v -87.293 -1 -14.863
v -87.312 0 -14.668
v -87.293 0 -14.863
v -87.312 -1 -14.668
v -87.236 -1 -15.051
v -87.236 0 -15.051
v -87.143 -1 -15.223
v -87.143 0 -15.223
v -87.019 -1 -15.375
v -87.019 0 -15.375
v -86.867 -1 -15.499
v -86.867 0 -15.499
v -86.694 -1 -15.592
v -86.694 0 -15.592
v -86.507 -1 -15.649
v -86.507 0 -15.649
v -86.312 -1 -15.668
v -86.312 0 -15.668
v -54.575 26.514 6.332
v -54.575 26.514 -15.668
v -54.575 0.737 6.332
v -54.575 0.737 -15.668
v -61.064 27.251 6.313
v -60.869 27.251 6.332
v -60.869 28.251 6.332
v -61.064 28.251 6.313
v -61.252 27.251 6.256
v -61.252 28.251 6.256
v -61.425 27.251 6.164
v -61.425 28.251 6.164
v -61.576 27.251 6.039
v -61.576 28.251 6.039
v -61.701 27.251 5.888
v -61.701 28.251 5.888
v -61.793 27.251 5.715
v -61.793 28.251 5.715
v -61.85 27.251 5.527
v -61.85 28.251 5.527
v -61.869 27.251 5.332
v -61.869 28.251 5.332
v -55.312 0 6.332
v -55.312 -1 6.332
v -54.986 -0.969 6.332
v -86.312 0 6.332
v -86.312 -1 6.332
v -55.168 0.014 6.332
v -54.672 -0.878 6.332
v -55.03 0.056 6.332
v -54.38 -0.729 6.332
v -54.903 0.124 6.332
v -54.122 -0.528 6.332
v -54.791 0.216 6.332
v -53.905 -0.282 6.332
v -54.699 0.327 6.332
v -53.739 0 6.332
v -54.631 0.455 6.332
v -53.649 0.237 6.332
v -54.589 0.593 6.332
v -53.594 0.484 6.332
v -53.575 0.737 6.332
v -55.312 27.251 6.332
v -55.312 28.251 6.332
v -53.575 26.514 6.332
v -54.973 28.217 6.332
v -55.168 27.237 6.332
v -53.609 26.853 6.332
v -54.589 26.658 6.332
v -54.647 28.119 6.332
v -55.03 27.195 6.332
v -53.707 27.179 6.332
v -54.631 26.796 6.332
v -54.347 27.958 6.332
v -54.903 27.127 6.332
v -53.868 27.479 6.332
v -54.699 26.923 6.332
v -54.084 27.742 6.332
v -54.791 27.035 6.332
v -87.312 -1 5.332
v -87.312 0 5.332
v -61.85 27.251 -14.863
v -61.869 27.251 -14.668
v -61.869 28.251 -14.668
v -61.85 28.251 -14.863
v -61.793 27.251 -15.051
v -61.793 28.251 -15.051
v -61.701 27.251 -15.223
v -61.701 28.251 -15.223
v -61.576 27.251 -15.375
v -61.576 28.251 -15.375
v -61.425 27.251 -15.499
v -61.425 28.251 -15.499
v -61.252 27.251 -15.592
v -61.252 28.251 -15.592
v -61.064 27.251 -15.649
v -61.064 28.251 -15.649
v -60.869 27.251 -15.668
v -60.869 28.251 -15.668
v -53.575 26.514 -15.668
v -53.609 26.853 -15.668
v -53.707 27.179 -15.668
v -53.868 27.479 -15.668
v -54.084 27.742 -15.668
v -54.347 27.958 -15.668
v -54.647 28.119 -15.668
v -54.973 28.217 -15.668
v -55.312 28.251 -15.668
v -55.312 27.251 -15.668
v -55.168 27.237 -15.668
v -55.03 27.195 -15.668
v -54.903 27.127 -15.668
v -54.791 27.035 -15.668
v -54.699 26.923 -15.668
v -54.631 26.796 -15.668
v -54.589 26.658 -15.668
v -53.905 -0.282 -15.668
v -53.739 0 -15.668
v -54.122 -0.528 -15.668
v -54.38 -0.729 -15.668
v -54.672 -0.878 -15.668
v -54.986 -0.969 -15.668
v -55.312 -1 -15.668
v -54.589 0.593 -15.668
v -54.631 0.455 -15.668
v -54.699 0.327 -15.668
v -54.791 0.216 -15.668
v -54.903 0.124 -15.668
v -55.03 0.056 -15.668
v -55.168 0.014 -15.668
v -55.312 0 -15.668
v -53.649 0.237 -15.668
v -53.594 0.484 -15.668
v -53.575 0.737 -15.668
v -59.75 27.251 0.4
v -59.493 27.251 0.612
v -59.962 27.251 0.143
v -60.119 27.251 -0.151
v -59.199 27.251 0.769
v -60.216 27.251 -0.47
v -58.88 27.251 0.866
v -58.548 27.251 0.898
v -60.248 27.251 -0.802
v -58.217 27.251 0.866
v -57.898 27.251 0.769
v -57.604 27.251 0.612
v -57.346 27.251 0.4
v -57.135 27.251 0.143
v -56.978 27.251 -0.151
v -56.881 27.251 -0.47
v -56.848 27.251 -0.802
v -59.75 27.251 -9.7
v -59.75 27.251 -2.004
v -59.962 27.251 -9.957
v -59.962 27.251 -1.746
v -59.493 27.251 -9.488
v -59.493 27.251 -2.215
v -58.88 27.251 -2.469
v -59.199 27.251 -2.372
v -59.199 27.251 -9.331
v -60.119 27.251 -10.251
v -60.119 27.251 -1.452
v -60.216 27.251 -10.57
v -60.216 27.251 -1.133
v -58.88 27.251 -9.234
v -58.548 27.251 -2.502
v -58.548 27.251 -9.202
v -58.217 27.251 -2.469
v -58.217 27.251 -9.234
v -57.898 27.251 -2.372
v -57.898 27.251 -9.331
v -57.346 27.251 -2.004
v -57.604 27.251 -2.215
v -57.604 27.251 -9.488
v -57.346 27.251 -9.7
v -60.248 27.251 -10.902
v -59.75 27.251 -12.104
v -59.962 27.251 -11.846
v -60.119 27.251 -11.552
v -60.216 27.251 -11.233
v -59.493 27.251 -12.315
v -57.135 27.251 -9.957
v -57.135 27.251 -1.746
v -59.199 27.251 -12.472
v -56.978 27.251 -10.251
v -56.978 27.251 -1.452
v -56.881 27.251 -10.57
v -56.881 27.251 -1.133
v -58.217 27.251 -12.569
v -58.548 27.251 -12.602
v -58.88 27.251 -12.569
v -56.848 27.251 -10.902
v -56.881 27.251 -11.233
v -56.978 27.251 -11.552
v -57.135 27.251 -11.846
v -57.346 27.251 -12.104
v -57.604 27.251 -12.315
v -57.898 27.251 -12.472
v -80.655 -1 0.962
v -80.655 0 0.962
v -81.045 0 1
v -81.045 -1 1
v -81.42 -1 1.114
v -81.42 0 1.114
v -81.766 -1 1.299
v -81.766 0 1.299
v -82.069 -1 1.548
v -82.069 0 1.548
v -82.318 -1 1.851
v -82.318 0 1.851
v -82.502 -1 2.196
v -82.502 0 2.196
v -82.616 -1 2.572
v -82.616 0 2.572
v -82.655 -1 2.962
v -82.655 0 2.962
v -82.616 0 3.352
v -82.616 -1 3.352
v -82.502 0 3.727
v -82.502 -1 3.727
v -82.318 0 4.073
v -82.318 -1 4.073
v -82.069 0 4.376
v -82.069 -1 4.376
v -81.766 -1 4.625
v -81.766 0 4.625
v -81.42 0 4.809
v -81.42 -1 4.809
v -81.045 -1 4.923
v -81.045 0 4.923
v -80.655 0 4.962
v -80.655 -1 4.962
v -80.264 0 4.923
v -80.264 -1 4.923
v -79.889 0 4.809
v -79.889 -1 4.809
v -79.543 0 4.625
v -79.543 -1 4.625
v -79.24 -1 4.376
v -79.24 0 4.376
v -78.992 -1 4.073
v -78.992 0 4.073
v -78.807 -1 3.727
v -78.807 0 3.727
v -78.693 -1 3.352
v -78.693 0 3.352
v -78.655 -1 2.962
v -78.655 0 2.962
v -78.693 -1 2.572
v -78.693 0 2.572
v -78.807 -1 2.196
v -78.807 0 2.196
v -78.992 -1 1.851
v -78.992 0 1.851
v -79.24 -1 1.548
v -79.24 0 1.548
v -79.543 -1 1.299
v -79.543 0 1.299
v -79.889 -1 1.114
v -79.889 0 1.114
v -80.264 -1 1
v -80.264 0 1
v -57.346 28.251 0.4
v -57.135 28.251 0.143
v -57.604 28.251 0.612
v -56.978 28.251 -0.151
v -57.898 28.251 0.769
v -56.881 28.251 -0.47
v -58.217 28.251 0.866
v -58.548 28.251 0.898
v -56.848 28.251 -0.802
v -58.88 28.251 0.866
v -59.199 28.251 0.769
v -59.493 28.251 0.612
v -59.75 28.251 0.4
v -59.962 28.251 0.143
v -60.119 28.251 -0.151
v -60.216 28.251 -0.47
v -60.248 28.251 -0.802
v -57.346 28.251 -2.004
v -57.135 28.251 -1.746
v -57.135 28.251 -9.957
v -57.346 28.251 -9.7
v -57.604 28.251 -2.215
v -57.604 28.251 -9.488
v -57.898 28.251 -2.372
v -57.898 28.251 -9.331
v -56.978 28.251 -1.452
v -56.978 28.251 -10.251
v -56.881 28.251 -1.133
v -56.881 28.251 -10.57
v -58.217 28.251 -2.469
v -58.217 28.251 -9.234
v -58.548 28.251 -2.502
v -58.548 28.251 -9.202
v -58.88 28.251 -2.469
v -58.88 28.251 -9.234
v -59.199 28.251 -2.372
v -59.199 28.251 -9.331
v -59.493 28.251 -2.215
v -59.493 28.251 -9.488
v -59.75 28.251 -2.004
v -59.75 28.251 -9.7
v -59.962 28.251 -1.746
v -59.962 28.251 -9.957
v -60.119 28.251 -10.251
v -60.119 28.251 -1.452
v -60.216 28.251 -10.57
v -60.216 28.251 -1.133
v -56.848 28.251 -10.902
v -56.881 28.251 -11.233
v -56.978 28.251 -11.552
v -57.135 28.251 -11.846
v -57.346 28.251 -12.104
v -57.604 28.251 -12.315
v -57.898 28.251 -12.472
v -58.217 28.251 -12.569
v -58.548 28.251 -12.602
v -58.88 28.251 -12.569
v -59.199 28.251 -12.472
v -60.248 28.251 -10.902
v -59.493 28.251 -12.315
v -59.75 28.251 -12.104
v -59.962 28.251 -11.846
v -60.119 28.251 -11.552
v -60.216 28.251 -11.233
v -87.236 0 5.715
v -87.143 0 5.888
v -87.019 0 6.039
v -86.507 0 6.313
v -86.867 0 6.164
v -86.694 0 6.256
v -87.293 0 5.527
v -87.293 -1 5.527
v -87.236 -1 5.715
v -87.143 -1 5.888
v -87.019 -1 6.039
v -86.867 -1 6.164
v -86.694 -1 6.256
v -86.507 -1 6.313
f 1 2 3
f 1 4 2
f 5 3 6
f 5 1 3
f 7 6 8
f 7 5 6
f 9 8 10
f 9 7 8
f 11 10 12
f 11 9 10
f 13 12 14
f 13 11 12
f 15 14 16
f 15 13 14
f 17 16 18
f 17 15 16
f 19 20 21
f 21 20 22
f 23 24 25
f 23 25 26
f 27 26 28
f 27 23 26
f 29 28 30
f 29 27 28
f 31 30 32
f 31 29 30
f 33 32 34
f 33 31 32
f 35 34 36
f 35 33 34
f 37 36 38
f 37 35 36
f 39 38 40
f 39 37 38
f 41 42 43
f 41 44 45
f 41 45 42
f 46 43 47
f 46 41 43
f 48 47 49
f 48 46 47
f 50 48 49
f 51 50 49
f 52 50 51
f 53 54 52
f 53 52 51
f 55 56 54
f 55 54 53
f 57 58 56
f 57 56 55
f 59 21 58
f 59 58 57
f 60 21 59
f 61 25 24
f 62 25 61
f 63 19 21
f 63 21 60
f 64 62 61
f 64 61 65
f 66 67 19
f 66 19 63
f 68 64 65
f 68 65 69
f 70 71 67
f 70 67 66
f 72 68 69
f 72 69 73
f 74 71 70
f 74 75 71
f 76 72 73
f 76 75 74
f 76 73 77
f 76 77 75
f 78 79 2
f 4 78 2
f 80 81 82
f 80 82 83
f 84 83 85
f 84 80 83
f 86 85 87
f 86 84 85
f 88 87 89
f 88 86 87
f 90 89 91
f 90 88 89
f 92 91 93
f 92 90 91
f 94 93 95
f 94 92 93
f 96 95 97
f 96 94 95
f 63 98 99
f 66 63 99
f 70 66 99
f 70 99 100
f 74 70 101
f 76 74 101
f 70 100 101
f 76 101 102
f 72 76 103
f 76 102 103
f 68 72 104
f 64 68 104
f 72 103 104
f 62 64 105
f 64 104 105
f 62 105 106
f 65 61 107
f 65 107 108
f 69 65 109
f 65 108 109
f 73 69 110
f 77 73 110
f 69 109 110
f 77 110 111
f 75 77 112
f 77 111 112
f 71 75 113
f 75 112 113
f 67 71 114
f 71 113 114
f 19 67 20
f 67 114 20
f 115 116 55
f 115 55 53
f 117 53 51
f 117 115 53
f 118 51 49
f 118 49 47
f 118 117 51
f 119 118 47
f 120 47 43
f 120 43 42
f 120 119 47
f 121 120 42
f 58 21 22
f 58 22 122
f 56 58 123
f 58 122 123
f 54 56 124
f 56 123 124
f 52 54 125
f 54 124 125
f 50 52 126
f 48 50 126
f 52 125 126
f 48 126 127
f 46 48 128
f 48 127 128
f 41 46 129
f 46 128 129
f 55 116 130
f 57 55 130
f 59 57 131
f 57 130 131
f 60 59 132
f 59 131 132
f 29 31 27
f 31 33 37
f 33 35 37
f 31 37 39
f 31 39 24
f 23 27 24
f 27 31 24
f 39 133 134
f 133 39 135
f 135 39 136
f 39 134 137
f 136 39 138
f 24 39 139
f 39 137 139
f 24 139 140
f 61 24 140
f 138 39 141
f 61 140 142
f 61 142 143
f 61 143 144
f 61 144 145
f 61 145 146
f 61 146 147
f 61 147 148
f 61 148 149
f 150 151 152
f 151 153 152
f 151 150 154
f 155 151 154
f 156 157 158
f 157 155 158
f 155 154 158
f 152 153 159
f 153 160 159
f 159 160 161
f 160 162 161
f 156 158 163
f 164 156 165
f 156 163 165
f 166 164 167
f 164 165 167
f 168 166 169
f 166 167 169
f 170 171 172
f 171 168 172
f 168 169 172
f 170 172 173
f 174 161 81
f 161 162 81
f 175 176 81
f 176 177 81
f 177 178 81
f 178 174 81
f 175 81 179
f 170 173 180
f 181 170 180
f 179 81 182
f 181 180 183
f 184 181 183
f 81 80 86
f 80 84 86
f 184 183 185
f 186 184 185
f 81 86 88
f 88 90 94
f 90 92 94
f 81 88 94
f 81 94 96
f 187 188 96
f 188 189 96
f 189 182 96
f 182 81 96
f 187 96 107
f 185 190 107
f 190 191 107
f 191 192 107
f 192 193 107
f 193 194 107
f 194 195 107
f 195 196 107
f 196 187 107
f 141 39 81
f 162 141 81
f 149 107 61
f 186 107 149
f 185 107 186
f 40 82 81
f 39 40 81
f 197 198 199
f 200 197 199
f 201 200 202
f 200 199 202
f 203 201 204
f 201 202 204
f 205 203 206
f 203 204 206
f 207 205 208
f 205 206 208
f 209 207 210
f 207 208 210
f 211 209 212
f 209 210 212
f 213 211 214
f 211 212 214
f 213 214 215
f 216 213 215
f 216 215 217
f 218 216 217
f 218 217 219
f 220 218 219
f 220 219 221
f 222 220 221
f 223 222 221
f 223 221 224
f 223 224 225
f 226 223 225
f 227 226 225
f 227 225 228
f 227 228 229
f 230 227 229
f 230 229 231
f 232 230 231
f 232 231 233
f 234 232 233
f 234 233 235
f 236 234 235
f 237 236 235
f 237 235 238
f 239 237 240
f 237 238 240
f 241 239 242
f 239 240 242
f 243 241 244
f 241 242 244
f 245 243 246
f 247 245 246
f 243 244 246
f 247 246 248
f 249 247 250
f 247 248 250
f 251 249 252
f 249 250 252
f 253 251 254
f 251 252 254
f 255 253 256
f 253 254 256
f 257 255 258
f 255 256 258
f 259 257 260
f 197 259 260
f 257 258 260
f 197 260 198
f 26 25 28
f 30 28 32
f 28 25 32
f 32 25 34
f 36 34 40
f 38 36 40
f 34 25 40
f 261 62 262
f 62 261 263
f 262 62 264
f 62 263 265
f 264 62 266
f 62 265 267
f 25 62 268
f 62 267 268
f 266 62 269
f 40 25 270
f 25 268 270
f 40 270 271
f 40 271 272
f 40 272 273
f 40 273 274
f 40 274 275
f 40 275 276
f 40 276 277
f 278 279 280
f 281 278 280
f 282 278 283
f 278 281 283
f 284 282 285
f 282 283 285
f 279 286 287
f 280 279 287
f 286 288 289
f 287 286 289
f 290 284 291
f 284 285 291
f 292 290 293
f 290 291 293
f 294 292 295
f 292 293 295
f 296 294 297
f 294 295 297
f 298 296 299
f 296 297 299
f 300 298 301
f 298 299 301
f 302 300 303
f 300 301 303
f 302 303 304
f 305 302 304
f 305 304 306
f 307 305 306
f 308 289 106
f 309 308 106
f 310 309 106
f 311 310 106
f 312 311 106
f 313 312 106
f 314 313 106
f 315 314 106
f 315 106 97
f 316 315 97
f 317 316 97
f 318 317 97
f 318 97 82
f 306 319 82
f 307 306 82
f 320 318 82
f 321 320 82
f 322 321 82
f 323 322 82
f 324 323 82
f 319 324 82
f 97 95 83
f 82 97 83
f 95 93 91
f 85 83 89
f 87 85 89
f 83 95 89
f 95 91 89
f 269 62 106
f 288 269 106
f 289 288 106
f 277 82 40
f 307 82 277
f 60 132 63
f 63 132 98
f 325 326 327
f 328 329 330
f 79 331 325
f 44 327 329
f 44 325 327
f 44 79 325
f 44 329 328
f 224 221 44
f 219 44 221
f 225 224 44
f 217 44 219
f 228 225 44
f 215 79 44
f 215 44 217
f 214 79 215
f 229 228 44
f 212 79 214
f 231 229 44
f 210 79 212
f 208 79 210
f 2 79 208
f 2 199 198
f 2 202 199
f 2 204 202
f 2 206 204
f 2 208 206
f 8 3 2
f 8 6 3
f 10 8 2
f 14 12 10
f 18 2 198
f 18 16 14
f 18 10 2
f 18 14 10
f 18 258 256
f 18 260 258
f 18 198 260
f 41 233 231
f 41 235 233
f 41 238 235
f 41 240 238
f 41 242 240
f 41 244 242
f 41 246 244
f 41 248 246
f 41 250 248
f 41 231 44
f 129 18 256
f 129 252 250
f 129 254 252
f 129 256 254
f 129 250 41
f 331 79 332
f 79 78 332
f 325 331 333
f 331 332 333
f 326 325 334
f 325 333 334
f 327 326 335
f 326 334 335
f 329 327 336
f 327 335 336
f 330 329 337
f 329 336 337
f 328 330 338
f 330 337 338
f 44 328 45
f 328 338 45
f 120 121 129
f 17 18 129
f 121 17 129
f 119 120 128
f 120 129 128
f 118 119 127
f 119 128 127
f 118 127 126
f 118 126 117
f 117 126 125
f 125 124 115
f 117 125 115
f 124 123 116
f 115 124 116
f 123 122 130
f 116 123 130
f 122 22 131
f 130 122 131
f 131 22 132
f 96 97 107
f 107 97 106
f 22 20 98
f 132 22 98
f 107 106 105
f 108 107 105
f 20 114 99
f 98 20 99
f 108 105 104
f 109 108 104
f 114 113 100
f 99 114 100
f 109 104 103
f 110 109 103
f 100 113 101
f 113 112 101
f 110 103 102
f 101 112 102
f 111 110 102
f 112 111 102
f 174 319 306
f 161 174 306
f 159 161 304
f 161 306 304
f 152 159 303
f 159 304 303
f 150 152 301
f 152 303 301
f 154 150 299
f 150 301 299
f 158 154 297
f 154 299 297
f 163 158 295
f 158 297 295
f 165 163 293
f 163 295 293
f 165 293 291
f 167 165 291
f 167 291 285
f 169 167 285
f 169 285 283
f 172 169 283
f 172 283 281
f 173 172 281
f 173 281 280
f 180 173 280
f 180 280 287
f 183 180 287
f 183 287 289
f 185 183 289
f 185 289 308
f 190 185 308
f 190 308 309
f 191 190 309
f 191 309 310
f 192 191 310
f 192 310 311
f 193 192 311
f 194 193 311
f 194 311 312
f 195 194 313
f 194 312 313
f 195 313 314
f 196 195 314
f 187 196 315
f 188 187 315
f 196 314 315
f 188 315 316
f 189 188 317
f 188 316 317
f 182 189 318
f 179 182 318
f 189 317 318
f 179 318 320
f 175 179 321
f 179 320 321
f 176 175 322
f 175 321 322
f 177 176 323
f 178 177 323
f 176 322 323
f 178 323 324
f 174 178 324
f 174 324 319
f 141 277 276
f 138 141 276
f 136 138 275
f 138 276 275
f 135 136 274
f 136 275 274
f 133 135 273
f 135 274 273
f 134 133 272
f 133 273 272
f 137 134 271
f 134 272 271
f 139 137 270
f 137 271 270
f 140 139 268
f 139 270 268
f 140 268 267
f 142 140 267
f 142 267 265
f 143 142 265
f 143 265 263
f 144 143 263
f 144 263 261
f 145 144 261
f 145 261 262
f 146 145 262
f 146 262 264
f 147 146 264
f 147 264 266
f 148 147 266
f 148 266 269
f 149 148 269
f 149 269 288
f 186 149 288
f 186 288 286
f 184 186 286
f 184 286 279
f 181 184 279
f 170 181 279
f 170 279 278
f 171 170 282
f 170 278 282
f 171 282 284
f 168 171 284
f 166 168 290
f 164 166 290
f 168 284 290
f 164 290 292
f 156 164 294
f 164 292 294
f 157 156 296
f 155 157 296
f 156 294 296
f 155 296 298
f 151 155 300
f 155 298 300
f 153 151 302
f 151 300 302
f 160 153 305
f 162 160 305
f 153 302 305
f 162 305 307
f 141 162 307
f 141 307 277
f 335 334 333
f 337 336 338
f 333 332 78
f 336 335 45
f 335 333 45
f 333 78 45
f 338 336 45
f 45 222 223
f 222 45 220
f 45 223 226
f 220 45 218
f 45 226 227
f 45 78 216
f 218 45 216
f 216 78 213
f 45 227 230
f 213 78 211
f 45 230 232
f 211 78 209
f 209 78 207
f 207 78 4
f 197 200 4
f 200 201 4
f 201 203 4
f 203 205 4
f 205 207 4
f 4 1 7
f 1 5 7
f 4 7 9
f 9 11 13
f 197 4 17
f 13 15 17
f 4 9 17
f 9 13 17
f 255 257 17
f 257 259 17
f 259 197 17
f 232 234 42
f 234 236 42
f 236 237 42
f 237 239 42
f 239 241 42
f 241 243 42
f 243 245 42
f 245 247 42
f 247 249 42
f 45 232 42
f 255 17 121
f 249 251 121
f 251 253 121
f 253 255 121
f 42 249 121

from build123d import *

# Parameters (mm, degrees)
SKETCH_1_W             = 68.22
SKETCH_1_H             = 22
SM_BASE_FLANGE_1_DEPTH = 1
FILLET_1_R             = 1
OTHER_START            = -15.667913645
OTHER_1_DEPTH          = 22
OTHER_1_2_DEPTH        = 22
OTHER_START_2          = 27.250753262
OTHER_1_3_DEPTH        = 1.749246738
SKETCH_7_R             = 2
CUT_EXTRUDE_1_DEPTH    = 40
SKETCH_7_6_R           = 1.7
CUT_EXTRUDE_4_DEPTH    = 20


with BuildPart() as part:
    # 基体-法兰1: sheet metal written as solids
    # Sketch 1 → 基体-法兰1 (new body)
    with BuildSketch(Plane(origin=(0, 0, 0), x_dir=(1, 0, 0), z_dir=(0, 1, 0))):
        with Locations((-53.201792275, 4.667913645)):
            Rectangle(SKETCH_1_W, SKETCH_1_H)
    extrude(amount=-SM_BASE_FLANGE_1_DEPTH)

    # 圆角1
    fillet_1_edges = [part.edges().sort_by_distance(p)[0] for p in [
        (-87.311792275, -0.5, -15.667913645),
        (-19.091792275, -0.5, -15.667913645),
        (-19.091792275, -0.5, 6.332086355),
        (-87.311792275, -0.5, 6.332086355),
    ]]
    fillet(fillet_1_edges, radius=FILLET_1_R)

    # Other 1: read off the stored shape, not the designer's step
    # Other 1 outline → Other 1 (cut)
    with BuildSketch(Plane.XY.offset(OTHER_START)):
        with BuildLine():
            Line((-19.091792275, 0), (-53.739151185, 0))
            ThreePointArc((-53.739151185, 0), (-54.379966111, -0.728828115), (-55.311792275, -1))
            Line((-55.311792275, -1), (-19.091792275, -1))
            Line((-19.091792275, -1), (-19.091792275, 0))
        make_face()
    extrude(amount=OTHER_1_DEPTH, mode=Mode.SUBTRACT)

    # Other 1 2 outline → Other 1 2 (add)
    with BuildSketch(Plane.XY.offset(OTHER_START)):
        with BuildLine():
            ThreePointArc((-53.739151185, 0), (-53.616677518, 0.359286442), (-53.575192275, 0.7366))
            Line((-53.575192275, 0.7366), (-53.575192275, 26.514153262))
            ThreePointArc((-53.575192275, 26.514153262), (-54.083830639, 27.742114898), (-55.311792275, 28.250753262))
            Line((-55.311792275, 28.250753262), (-61.869345538, 28.250753262))
            Line((-61.869345538, 28.250753262), (-61.869345538, 27.250753262))
            Line((-61.869345538, 27.250753262), (-55.311792275, 27.250753262))
            ThreePointArc((-55.311792275, 27.250753262), (-54.79093742, 27.035008117), (-54.575192275, 26.514153262))
            Line((-54.575192275, 26.514153262), (-54.575192275, 0.7366))
            ThreePointArc((-54.575192275, 0.7366), (-54.79093742, 0.215745145), (-55.311792275, 0))
            Line((-55.311792275, 0), (-53.739151185, 0))
        make_face()
    extrude(amount=OTHER_1_2_DEPTH)

    # Other 1 3 outline → Other 1 3 (cut)
    with BuildSketch(Plane(origin=(0, 0, 0), x_dir=(1, 0, 0), z_dir=(0, 1, 0)).offset(OTHER_START_2)):
        with BuildLine():
            Line((-61.869345538, -6.332086355), (-60.869345538, -6.332086355))
            ThreePointArc((-60.869345538, -6.332086355), (-61.576452319, -6.039193136), (-61.869345538, -5.332086355))
            Line((-61.869345538, -5.332086355), (-61.869345538, -6.332086355))
        make_face()
        with BuildLine():
            Line((-61.869345538, 15.667913645), (-61.869345538, 14.667913645))
            ThreePointArc((-61.869345538, 14.667913645), (-61.576452319, 15.375020426), (-60.869345538, 15.667913645))
            Line((-60.869345538, 15.667913645), (-61.869345538, 15.667913645))
        make_face()
    extrude(amount=OTHER_1_3_DEPTH, mode=Mode.SUBTRACT)

    # 草图7 → 切除-拉伸1 (cut)
    with BuildSketch(Plane(origin=(0, 28.250753262, 0), x_dir=(1, 0, 0), z_dir=(0, 1, 0))):
        with Locations(Location((-80.654608631, -2.961737693, 0), (0, 0, 90))):
            Circle(SKETCH_7_R)
    extrude(amount=-CUT_EXTRUDE_1_DEPTH, mode=Mode.SUBTRACT)

    # 草图7<6> → 切除-拉伸4 (cut)
    with BuildSketch(Plane(origin=(0, 28.250753262, 0), x_dir=(1, 0, 0), z_dir=(0, 1, 0))):
        with Locations(Location((-58.548227621, 10.901663137, 0), (0, 0, 180))):
            Circle(SKETCH_7_6_R)
        with Locations(Location((-58.548227621, 0.801663137, 0), (0, 0, 180))):
            Circle(SKETCH_7_6_R)
    extrude(amount=-CUT_EXTRUDE_4_DEPTH, mode=Mode.SUBTRACT)


solid = part.part
